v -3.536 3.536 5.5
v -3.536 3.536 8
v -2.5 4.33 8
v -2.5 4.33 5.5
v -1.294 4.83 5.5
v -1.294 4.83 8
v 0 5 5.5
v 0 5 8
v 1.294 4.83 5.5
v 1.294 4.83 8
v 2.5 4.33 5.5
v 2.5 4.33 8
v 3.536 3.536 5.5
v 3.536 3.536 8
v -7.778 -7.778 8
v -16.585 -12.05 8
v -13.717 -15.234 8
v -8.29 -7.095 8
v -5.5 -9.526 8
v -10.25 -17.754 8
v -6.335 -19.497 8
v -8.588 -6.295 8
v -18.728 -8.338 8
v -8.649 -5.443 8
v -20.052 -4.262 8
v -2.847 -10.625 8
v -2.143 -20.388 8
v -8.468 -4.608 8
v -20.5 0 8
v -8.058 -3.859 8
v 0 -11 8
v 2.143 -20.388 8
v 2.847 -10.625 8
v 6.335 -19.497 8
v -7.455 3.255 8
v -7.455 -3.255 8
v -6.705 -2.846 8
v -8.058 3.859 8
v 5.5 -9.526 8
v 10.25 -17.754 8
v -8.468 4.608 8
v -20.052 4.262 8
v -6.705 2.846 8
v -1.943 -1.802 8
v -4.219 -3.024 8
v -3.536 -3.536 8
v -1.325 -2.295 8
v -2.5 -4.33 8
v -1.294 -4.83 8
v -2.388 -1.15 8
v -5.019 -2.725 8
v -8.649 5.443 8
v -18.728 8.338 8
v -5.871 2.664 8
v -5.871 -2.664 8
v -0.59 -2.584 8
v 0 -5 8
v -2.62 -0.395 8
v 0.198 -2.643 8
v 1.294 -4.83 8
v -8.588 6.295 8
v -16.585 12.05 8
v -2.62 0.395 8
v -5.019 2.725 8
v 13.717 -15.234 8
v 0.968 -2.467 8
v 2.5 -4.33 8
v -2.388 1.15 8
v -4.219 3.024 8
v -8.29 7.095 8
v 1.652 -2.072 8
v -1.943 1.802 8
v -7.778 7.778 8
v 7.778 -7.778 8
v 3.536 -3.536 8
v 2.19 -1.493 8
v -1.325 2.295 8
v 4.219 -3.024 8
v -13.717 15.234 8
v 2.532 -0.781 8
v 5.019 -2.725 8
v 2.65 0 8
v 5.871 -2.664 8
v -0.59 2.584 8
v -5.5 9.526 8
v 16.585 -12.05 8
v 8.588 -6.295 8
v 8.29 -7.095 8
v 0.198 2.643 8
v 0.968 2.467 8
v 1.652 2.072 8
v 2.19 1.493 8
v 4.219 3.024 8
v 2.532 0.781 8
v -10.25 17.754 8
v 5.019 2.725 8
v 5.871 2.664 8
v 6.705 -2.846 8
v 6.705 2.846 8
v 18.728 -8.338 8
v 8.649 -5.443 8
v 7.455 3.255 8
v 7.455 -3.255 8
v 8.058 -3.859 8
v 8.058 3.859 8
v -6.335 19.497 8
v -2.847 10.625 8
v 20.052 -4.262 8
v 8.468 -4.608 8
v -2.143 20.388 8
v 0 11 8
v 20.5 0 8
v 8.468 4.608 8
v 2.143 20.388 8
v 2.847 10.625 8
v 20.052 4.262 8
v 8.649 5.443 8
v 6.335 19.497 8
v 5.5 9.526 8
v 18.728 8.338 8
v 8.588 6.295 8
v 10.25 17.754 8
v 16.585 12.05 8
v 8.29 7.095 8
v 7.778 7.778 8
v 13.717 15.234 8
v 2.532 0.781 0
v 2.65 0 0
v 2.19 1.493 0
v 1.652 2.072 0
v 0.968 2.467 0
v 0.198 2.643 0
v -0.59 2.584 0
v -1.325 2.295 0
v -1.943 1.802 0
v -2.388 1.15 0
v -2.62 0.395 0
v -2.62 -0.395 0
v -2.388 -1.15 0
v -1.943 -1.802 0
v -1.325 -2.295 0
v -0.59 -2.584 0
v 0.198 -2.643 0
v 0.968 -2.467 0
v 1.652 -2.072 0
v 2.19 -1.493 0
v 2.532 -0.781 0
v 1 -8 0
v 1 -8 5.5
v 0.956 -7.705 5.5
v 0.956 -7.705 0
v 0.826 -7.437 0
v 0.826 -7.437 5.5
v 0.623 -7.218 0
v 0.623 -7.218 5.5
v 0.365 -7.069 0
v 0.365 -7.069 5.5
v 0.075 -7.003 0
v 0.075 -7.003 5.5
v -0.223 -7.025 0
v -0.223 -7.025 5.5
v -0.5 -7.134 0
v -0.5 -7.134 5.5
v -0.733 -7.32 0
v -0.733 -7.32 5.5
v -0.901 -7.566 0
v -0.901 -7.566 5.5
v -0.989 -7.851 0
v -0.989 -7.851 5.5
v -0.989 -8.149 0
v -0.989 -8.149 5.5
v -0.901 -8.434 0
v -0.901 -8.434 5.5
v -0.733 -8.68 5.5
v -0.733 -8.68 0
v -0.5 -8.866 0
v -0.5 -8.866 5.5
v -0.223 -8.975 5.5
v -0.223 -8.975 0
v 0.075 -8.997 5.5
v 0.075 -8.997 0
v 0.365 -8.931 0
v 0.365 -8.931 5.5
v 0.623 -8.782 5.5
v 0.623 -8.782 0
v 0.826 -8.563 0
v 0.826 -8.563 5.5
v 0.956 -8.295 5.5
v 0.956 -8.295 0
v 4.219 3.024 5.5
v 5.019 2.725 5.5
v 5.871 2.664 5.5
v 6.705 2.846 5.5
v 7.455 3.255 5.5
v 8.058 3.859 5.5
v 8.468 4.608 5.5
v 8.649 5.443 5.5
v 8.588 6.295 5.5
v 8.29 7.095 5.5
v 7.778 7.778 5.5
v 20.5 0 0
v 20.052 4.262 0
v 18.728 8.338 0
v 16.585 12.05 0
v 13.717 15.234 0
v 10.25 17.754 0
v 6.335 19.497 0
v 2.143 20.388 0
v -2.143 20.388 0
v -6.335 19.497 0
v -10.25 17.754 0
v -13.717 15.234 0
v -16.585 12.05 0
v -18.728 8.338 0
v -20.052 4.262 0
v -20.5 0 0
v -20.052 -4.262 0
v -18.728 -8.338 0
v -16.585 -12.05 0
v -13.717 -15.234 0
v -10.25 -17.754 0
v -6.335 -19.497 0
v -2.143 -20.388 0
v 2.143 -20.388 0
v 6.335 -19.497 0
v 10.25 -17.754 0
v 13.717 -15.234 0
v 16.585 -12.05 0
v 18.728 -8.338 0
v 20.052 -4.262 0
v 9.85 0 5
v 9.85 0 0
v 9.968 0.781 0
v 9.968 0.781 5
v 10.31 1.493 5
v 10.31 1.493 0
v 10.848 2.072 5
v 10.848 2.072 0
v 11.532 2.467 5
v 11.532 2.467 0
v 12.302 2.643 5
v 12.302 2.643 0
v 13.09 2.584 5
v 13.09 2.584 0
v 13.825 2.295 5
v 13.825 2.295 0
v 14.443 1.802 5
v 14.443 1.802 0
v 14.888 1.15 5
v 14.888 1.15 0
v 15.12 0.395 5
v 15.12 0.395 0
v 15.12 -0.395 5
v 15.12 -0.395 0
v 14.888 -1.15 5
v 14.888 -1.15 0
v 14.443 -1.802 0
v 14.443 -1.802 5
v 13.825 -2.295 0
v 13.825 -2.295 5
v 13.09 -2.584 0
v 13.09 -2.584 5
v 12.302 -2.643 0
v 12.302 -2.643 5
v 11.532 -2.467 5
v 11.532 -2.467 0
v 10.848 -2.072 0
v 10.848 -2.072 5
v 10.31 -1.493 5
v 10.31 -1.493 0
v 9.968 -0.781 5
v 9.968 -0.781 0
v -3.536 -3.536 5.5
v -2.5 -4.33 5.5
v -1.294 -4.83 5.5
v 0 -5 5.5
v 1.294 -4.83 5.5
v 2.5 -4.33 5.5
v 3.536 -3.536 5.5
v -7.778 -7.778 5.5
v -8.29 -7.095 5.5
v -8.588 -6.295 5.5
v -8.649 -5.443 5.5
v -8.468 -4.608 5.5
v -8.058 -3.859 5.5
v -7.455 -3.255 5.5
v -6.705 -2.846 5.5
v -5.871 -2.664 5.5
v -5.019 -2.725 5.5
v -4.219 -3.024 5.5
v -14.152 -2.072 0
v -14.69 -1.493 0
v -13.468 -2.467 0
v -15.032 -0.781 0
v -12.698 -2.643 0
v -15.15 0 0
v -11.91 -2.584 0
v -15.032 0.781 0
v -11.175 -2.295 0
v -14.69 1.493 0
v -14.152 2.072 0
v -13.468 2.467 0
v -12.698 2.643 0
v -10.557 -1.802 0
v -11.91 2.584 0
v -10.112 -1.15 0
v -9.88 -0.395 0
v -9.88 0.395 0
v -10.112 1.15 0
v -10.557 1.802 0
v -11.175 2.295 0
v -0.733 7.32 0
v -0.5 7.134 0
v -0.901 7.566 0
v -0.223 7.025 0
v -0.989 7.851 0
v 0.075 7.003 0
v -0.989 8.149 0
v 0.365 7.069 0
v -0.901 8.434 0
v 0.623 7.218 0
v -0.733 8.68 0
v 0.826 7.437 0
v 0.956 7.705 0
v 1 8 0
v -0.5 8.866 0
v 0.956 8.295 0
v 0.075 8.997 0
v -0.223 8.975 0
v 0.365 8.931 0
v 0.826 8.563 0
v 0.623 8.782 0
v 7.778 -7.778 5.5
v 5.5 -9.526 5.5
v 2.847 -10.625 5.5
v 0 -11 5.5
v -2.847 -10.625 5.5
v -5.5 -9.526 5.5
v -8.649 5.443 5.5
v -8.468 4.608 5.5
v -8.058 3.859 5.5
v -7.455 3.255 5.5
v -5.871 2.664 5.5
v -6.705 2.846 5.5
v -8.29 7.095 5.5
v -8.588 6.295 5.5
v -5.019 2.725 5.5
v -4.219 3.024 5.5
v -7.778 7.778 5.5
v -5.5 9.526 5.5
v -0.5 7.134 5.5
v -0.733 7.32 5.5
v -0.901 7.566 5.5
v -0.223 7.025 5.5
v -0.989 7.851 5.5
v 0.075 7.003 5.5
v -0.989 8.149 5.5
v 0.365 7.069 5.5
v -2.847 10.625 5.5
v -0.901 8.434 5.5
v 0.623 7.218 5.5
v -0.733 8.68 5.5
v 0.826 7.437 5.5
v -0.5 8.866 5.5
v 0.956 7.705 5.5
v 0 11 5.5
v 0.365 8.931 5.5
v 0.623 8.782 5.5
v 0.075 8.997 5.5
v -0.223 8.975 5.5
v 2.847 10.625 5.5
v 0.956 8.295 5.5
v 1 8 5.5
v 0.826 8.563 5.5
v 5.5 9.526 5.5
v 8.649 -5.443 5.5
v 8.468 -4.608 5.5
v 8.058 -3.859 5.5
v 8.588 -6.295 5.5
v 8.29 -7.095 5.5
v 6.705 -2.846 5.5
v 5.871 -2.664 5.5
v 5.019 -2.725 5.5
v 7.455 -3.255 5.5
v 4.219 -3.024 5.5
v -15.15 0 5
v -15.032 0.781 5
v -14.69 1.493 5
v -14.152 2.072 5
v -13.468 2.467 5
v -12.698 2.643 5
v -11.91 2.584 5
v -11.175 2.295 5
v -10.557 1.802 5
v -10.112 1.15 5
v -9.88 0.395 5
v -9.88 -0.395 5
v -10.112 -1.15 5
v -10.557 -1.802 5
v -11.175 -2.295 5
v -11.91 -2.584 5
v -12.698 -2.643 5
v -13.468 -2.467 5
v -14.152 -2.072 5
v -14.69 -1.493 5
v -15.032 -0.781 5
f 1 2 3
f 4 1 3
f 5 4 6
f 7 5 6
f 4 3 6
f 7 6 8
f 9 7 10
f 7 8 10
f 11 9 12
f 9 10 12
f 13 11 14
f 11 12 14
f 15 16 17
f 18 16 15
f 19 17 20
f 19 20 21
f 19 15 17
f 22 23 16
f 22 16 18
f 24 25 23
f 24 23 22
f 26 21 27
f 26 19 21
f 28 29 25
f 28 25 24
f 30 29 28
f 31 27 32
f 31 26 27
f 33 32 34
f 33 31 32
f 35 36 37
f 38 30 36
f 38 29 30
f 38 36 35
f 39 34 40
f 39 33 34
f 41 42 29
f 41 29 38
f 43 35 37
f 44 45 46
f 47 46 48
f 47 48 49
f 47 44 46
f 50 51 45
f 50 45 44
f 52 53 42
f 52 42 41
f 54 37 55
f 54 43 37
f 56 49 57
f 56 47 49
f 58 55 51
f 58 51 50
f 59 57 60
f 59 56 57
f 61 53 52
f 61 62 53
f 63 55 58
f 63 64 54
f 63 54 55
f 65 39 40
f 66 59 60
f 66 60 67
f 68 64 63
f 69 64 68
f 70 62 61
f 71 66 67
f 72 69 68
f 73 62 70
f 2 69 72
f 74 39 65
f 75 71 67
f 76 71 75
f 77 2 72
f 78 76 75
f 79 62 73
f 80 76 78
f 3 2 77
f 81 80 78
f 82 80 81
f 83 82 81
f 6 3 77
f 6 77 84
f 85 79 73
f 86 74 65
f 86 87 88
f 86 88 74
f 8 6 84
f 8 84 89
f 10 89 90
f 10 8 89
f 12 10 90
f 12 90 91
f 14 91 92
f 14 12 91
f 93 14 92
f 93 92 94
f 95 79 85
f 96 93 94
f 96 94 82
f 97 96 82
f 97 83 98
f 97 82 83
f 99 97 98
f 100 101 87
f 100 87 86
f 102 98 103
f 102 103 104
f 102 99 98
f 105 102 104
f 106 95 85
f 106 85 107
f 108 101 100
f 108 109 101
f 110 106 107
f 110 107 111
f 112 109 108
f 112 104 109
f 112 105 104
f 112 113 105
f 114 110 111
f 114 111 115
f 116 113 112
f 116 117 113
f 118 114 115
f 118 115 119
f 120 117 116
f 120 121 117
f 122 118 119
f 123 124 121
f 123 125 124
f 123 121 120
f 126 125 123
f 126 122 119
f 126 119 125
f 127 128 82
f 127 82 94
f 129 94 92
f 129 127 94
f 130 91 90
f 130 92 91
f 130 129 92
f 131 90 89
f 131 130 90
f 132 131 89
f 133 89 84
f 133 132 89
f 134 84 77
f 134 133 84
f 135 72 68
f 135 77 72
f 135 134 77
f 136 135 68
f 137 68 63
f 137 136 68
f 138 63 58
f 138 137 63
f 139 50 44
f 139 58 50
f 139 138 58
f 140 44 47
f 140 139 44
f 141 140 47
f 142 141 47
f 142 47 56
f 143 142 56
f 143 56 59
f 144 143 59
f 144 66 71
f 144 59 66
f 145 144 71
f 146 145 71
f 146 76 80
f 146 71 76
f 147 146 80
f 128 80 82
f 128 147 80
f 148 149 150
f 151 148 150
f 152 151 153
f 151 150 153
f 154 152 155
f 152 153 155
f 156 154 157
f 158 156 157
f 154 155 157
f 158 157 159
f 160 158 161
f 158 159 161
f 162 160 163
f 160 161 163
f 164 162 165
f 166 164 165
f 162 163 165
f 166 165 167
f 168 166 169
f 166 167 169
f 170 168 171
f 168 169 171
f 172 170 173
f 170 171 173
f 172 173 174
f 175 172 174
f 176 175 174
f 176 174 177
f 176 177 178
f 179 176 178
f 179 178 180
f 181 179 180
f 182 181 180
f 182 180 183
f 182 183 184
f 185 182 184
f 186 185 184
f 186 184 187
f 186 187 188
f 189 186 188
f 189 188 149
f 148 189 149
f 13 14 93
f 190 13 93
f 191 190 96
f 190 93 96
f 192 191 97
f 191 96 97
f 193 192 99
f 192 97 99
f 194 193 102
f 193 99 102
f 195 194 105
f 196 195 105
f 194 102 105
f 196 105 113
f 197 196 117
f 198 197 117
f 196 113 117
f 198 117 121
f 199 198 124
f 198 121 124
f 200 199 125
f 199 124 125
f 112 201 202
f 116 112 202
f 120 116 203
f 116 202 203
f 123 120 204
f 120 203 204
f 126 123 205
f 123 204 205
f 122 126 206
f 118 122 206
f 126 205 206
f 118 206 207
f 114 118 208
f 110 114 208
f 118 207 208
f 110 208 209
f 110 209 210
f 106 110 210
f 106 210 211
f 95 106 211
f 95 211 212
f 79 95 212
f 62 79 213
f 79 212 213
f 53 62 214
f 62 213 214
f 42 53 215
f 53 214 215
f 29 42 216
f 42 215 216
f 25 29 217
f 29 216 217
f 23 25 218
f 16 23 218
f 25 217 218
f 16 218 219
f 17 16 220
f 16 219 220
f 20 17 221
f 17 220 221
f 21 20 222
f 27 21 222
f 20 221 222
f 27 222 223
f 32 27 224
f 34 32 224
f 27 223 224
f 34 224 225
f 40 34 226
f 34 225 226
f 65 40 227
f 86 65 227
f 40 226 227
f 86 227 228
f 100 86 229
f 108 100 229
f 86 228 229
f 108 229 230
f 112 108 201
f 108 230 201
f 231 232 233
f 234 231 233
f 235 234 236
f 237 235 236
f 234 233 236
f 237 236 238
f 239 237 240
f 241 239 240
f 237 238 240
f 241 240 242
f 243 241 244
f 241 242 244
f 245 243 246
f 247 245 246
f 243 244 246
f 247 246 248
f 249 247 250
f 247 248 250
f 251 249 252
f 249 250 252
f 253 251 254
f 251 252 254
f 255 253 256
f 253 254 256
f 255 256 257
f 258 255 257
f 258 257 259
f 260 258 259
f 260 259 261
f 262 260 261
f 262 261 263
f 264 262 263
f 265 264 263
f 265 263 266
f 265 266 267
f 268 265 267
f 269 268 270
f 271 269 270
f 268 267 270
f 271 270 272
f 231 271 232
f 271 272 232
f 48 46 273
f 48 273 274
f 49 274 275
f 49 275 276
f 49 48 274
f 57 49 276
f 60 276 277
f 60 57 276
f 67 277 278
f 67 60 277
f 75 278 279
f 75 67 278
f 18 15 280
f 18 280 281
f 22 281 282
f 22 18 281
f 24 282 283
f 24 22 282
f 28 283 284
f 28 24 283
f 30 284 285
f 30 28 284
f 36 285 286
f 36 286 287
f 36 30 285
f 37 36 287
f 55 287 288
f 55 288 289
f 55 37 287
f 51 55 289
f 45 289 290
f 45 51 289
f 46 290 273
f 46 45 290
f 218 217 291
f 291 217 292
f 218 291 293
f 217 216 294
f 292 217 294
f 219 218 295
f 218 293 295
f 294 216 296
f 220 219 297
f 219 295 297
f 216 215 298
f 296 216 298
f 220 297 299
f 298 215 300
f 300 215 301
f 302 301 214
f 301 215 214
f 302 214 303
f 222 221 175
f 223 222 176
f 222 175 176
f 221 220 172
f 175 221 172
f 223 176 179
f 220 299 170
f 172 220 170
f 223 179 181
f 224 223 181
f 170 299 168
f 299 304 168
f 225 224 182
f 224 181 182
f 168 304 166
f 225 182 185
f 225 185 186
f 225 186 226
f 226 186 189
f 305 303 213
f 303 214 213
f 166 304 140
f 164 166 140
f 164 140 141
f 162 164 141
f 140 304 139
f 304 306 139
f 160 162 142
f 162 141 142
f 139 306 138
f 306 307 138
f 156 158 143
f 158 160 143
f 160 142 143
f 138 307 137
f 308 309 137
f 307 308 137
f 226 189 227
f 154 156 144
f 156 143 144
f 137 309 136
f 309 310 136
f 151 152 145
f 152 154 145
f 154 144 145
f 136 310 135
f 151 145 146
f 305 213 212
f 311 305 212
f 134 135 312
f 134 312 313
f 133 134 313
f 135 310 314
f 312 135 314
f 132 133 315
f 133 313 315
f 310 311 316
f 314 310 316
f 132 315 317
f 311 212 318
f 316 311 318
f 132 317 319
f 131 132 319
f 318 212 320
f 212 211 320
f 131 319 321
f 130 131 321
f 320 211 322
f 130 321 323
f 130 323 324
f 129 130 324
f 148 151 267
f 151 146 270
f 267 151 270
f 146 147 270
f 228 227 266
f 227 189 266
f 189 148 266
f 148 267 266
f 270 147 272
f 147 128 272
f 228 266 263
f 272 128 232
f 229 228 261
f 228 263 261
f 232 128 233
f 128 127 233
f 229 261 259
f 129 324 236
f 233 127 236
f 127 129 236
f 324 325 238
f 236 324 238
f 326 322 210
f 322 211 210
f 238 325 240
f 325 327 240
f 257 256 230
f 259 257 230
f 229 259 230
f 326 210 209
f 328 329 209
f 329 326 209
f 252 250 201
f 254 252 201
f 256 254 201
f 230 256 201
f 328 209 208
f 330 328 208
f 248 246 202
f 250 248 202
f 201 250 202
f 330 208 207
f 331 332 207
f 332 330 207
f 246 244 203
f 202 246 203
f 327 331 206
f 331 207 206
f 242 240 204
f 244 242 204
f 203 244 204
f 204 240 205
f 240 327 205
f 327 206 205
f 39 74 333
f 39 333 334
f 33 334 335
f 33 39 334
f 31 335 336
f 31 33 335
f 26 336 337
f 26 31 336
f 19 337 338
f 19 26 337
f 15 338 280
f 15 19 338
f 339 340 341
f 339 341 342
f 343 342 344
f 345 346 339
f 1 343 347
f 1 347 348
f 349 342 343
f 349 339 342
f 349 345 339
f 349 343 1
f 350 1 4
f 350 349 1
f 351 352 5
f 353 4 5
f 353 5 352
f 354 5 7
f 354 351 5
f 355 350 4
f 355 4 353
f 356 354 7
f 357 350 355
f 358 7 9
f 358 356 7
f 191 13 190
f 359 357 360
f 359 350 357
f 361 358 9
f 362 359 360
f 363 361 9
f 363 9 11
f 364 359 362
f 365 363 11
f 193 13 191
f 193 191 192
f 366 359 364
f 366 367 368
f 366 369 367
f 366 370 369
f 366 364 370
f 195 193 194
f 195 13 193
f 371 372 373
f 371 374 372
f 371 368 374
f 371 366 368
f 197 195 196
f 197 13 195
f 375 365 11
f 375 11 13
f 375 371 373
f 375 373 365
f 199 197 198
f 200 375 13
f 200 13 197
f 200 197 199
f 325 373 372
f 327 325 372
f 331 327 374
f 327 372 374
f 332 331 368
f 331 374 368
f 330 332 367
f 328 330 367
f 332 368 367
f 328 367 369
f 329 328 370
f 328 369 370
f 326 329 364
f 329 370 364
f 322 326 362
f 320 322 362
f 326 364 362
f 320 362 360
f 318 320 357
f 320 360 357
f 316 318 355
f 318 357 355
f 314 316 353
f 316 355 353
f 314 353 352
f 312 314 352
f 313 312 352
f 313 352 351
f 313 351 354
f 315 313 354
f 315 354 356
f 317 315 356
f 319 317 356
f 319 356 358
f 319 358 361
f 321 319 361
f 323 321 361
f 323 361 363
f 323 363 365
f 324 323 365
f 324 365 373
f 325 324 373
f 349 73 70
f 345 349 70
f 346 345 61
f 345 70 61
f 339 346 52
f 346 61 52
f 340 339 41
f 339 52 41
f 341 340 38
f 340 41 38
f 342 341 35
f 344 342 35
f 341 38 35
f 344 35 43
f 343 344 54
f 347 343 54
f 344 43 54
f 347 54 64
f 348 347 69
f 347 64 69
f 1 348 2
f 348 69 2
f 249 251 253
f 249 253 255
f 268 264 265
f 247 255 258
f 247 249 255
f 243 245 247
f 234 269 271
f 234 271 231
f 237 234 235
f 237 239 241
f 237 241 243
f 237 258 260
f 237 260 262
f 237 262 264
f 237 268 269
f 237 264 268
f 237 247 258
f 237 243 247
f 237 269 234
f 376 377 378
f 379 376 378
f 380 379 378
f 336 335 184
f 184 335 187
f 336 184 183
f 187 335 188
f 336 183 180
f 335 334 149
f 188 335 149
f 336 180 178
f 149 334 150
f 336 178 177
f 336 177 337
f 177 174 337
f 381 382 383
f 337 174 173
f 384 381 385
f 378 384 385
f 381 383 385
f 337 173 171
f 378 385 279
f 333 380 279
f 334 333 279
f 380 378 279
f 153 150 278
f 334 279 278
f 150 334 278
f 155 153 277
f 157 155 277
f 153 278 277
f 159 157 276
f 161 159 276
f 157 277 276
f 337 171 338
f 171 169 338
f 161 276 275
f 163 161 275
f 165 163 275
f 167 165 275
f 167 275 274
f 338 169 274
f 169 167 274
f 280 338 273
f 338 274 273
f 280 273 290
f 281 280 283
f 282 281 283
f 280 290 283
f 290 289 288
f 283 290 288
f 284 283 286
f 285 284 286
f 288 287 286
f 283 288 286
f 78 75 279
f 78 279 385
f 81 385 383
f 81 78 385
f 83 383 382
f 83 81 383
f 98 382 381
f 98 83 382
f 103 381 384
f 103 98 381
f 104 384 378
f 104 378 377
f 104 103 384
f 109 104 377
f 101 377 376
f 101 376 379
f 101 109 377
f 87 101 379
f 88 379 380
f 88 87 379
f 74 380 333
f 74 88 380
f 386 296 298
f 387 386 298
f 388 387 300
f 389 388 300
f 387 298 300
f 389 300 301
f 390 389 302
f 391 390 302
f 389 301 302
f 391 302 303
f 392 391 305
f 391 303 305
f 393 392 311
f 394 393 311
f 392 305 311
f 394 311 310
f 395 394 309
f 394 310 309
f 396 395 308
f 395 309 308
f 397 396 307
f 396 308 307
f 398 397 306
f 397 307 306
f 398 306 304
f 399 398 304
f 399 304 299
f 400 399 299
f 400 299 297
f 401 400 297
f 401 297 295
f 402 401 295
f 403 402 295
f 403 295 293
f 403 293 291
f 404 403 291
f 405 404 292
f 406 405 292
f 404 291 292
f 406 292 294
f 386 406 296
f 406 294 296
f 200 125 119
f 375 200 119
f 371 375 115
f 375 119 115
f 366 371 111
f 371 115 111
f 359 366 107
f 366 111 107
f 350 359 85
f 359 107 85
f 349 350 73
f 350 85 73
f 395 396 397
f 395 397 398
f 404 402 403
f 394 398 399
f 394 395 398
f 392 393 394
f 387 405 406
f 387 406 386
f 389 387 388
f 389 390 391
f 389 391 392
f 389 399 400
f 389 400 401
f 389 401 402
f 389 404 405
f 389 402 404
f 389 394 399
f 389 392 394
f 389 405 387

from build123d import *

# Parameters (mm, degrees)
SKETCH_1_R               = 20.5
EXTRUDE_1_DEPTH          = 8
CUT_EXTRUDE_1_DEPTH      = 31.074906484
CUT_EXTRUDE_1_DEPTH_BACK = 31.074906484
SKETCH_1_3_R             = 2.65
SKETCH_9_R               = 1
CUT_EXTRUDE_2_DEPTH      = 2.5
SKETCH_9_3_R             = 1
CUT_EXTRUDE_3_DEPTH      = 31.074906484
SKETCH_12_R              = 2.65
CUT_EXTRUDE_4_DEPTH      = 5


with BuildPart() as part:
    # 스케치1 → 보스-돌출1 (new body)
    with BuildSketch(Plane.XY):
        Circle(SKETCH_1_R)
    extrude(amount=EXTRUDE_1_DEPTH)

    # 스케치1<3> → 컷-돌출1 (cut, two sides: drawn at the far end of the back side and taken through both)
    with BuildSketch(Plane.XY.offset(-CUT_EXTRUDE_1_DEPTH_BACK)):
        Circle(SKETCH_1_3_R)
    extrude(amount=CUT_EXTRUDE_1_DEPTH + CUT_EXTRUDE_1_DEPTH_BACK, mode=Mode.SUBTRACT)

    # 스케치9 → 컷-돌출2 (cut)
    # profile 1 of 2: a face of its own
    with BuildSketch(Plane.XY.offset(8)):
        with BuildLine():
            ThreePointArc((3.535533906, 3.535533906), (7.778174593, 3.535533906), (7.778174593, 7.778174593))
            ThreePointArc((7.778174593, 7.778174593), (0, 11), (-7.778174593, 7.778174593))
            ThreePointArc((-7.778174593, 7.778174593), (-7.778174593, 3.535533906), (-3.535533906, 3.535533906))
            ThreePointArc((-3.535533906, 3.535533906), (0, 5), (3.535533906, 3.535533906))
        make_face()
        with Locations((0, 8)):
            Circle(SKETCH_9_R, mode=Mode.SUBTRACT)
    # profile 2 of 2: a face of its own
    with BuildSketch(Plane.XY.offset(8)):
        with BuildLine():
            ThreePointArc((-7.778174593, -7.778174593), (0, -11), (7.778174593, -7.778174593))
            ThreePointArc((7.778174593, -7.778174593), (7.778174593, -3.535533906), (3.535533906, -3.535533906))
            ThreePointArc((3.535533906, -3.535533906), (0, -5), (-3.535533906, -3.535533906))
            ThreePointArc((-3.535533906, -3.535533906), (-7.778174593, -3.535533906), (-7.778174593, -7.778174593))
        make_face()
        with Locations((0, -8)):
            Circle(SKETCH_9_R, mode=Mode.SUBTRACT)
    extrude(amount=-CUT_EXTRUDE_2_DEPTH, mode=Mode.SUBTRACT)

    # 스케치9<3> → 컷-돌출3 (cut, through all)
    with BuildSketch(Plane.XY.offset(8)):
        with Locations((0, 8)):
            Circle(SKETCH_9_3_R)
        with Locations((0, -8)):
            Circle(SKETCH_9_3_R)
    extrude(amount=-CUT_EXTRUDE_3_DEPTH, mode=Mode.SUBTRACT)

    # 스케치12 → 컷-돌출4 (cut)
    with BuildSketch(Plane(origin=(0, 0, 0), x_dir=(-1, 0, 0), z_dir=(0, 0, -1))):
        with Locations((-12.5, 0)):
            Circle(SKETCH_12_R)
        with Locations((12.5, 0)):
            Circle(SKETCH_12_R)
    extrude(amount=-CUT_EXTRUDE_4_DEPTH, mode=Mode.SUBTRACT)


solid = part.part
